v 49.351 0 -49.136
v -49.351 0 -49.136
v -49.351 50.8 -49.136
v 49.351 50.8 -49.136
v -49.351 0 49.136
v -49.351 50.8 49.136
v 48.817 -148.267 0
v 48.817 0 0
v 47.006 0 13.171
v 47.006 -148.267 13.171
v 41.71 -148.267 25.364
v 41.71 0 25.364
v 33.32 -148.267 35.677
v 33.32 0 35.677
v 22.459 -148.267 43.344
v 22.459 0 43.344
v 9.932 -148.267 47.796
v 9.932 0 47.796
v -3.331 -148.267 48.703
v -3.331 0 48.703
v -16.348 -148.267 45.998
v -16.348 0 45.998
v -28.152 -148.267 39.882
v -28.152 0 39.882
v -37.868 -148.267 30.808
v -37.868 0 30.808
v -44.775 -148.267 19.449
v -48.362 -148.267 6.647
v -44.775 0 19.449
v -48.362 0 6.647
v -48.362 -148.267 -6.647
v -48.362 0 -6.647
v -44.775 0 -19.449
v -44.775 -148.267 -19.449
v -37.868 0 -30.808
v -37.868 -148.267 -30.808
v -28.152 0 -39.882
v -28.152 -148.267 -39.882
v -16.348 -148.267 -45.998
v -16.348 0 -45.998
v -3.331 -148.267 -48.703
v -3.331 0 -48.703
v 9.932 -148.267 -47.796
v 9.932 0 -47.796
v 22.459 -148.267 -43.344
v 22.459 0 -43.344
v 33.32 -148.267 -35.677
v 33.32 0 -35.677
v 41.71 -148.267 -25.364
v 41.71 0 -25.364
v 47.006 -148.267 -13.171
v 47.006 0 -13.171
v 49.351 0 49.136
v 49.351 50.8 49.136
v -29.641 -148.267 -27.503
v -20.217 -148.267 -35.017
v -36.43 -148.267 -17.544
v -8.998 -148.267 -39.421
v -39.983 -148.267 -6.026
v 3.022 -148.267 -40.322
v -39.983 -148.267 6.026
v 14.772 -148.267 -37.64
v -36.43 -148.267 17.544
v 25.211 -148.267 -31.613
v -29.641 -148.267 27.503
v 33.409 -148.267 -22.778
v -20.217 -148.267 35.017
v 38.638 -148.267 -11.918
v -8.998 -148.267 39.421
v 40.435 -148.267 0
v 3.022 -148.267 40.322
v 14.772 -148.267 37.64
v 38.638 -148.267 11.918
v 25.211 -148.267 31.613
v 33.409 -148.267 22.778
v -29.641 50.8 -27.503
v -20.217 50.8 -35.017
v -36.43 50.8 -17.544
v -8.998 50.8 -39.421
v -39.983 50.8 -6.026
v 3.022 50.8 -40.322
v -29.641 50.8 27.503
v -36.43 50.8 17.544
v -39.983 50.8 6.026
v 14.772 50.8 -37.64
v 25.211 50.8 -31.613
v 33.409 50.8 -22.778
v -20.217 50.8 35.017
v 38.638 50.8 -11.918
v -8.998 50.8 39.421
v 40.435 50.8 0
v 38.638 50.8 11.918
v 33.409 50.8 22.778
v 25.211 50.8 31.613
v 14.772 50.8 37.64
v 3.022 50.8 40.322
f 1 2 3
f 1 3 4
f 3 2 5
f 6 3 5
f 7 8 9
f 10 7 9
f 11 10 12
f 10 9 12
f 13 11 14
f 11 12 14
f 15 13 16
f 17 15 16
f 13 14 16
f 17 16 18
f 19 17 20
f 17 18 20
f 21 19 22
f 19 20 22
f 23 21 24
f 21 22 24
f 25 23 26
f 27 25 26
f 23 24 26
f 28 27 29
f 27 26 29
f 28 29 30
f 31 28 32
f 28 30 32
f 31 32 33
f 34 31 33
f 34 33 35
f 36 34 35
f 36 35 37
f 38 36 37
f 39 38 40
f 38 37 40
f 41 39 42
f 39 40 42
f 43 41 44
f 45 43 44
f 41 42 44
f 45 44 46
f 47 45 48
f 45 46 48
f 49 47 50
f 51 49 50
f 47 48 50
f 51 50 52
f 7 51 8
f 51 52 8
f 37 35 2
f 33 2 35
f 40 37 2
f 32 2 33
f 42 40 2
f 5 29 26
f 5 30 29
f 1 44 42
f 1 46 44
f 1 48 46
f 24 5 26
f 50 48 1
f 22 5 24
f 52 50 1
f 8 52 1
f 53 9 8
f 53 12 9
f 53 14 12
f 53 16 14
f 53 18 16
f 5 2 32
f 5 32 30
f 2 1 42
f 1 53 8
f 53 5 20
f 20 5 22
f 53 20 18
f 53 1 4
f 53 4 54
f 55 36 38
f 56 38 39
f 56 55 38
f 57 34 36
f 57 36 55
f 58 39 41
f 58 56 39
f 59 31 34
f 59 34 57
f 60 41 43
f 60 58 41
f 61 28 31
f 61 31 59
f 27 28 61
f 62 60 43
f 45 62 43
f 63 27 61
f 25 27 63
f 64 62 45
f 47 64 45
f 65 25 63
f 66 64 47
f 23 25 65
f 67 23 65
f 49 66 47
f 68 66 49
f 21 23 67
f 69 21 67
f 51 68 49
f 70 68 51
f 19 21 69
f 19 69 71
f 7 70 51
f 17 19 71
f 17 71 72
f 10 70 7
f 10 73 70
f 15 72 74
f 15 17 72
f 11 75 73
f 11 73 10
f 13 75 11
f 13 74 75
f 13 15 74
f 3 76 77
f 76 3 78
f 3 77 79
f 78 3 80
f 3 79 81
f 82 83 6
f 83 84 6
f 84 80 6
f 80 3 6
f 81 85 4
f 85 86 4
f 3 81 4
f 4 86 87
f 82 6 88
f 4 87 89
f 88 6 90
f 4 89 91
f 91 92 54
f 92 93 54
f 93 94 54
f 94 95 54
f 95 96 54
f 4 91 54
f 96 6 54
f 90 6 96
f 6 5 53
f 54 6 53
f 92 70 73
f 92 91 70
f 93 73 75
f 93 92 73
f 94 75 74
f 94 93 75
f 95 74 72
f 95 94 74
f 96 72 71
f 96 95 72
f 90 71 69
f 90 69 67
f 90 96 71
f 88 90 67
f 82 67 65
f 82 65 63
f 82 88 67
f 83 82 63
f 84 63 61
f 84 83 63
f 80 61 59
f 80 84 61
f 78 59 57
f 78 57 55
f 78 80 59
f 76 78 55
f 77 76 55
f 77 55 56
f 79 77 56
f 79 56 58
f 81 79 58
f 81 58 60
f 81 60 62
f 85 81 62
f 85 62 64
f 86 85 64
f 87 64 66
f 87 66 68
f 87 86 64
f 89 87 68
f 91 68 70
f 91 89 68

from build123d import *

# Parameters (mm, degrees)
F0_W     = 98.7017413428
F0_H     = 98.2726
F0_R     = 40.4346760416
F1_DEPTH = 50.8
F2_R     = 48.8166771829
F2_R_2   = 40.4346760416
F3_DEPTH = 148.2671336


# Not quite as in the source:
# - an extrude ends at something that could not be found from the text; its depth is read off the source's solid


with BuildPart() as f1:
    # F0 (on Front) → F1 (new body)
    with BuildSketch(Plane.XZ):
        Rectangle(F0_W, F0_H)
        Circle(F0_R, mode=Mode.SUBTRACT)
    extrude(amount=-F1_DEPTH)

    # F2 (on face) → F3 (join, through all)
    with BuildSketch(Plane.XZ):
        Circle(F2_R)
        Circle(F2_R_2, mode=Mode.SUBTRACT)
    extrude(amount=F3_DEPTH)


solid = f1.part
